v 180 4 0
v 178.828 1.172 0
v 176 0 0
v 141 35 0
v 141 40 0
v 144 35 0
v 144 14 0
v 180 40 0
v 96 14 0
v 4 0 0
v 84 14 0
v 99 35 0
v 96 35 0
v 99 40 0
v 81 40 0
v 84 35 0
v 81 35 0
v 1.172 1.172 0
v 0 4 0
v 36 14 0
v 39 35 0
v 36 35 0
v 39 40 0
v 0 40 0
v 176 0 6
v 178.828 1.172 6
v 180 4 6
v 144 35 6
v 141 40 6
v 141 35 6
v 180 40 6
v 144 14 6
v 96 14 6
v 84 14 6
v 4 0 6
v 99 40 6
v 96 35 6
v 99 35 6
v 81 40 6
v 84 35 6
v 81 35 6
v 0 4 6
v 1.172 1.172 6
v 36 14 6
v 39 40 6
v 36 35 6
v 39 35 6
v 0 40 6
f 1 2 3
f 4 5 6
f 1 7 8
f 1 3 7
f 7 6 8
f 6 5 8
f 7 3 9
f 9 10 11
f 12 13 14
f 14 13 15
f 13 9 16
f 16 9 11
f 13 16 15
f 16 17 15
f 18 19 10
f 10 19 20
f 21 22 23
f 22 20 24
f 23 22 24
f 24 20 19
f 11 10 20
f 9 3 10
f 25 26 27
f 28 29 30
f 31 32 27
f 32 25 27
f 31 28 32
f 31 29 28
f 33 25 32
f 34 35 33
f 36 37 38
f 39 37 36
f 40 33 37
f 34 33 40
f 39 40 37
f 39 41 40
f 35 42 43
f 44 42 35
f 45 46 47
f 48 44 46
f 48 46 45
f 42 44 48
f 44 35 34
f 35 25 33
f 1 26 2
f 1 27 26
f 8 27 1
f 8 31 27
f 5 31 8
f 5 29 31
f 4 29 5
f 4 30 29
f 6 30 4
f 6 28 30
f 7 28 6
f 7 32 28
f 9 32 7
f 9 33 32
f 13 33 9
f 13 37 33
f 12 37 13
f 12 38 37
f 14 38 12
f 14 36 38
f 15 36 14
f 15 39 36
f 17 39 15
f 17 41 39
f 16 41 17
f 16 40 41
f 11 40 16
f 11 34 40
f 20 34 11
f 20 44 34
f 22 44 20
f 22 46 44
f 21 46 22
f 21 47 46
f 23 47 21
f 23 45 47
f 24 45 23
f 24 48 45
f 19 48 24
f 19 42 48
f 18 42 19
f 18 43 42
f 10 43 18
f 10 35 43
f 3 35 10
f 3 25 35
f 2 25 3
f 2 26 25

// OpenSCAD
$fn = 32;

// ----------------------------------------------------------------------
// Oversize slot bar: 180 mm bar with 2 oversize windows
// ----------------------------------------------------------------------

// --- parameters (mm) ---
profile_height = 6;       // extrusion height
profile_points = 24;      // points of the closed outline

profile = [[0, 4], [1.172, 1.172], [4, 0], [176, 0], [178.828, 1.172], [180, 4], [180, 40], [141, 40], [141, 35], [144, 35], [144, 14], [96, 14], [96, 35], [99, 35], [99, 40], [81, 40], [81, 35], [84, 35], [84, 14], [36, 14], [36, 35], [39, 35], [39, 40], [0, 40]];  // single closed polygon, 24 points, counter clockwise

// --- the one profile operation ---
linear_extrude(height = profile_height) polygon(points = profile);
